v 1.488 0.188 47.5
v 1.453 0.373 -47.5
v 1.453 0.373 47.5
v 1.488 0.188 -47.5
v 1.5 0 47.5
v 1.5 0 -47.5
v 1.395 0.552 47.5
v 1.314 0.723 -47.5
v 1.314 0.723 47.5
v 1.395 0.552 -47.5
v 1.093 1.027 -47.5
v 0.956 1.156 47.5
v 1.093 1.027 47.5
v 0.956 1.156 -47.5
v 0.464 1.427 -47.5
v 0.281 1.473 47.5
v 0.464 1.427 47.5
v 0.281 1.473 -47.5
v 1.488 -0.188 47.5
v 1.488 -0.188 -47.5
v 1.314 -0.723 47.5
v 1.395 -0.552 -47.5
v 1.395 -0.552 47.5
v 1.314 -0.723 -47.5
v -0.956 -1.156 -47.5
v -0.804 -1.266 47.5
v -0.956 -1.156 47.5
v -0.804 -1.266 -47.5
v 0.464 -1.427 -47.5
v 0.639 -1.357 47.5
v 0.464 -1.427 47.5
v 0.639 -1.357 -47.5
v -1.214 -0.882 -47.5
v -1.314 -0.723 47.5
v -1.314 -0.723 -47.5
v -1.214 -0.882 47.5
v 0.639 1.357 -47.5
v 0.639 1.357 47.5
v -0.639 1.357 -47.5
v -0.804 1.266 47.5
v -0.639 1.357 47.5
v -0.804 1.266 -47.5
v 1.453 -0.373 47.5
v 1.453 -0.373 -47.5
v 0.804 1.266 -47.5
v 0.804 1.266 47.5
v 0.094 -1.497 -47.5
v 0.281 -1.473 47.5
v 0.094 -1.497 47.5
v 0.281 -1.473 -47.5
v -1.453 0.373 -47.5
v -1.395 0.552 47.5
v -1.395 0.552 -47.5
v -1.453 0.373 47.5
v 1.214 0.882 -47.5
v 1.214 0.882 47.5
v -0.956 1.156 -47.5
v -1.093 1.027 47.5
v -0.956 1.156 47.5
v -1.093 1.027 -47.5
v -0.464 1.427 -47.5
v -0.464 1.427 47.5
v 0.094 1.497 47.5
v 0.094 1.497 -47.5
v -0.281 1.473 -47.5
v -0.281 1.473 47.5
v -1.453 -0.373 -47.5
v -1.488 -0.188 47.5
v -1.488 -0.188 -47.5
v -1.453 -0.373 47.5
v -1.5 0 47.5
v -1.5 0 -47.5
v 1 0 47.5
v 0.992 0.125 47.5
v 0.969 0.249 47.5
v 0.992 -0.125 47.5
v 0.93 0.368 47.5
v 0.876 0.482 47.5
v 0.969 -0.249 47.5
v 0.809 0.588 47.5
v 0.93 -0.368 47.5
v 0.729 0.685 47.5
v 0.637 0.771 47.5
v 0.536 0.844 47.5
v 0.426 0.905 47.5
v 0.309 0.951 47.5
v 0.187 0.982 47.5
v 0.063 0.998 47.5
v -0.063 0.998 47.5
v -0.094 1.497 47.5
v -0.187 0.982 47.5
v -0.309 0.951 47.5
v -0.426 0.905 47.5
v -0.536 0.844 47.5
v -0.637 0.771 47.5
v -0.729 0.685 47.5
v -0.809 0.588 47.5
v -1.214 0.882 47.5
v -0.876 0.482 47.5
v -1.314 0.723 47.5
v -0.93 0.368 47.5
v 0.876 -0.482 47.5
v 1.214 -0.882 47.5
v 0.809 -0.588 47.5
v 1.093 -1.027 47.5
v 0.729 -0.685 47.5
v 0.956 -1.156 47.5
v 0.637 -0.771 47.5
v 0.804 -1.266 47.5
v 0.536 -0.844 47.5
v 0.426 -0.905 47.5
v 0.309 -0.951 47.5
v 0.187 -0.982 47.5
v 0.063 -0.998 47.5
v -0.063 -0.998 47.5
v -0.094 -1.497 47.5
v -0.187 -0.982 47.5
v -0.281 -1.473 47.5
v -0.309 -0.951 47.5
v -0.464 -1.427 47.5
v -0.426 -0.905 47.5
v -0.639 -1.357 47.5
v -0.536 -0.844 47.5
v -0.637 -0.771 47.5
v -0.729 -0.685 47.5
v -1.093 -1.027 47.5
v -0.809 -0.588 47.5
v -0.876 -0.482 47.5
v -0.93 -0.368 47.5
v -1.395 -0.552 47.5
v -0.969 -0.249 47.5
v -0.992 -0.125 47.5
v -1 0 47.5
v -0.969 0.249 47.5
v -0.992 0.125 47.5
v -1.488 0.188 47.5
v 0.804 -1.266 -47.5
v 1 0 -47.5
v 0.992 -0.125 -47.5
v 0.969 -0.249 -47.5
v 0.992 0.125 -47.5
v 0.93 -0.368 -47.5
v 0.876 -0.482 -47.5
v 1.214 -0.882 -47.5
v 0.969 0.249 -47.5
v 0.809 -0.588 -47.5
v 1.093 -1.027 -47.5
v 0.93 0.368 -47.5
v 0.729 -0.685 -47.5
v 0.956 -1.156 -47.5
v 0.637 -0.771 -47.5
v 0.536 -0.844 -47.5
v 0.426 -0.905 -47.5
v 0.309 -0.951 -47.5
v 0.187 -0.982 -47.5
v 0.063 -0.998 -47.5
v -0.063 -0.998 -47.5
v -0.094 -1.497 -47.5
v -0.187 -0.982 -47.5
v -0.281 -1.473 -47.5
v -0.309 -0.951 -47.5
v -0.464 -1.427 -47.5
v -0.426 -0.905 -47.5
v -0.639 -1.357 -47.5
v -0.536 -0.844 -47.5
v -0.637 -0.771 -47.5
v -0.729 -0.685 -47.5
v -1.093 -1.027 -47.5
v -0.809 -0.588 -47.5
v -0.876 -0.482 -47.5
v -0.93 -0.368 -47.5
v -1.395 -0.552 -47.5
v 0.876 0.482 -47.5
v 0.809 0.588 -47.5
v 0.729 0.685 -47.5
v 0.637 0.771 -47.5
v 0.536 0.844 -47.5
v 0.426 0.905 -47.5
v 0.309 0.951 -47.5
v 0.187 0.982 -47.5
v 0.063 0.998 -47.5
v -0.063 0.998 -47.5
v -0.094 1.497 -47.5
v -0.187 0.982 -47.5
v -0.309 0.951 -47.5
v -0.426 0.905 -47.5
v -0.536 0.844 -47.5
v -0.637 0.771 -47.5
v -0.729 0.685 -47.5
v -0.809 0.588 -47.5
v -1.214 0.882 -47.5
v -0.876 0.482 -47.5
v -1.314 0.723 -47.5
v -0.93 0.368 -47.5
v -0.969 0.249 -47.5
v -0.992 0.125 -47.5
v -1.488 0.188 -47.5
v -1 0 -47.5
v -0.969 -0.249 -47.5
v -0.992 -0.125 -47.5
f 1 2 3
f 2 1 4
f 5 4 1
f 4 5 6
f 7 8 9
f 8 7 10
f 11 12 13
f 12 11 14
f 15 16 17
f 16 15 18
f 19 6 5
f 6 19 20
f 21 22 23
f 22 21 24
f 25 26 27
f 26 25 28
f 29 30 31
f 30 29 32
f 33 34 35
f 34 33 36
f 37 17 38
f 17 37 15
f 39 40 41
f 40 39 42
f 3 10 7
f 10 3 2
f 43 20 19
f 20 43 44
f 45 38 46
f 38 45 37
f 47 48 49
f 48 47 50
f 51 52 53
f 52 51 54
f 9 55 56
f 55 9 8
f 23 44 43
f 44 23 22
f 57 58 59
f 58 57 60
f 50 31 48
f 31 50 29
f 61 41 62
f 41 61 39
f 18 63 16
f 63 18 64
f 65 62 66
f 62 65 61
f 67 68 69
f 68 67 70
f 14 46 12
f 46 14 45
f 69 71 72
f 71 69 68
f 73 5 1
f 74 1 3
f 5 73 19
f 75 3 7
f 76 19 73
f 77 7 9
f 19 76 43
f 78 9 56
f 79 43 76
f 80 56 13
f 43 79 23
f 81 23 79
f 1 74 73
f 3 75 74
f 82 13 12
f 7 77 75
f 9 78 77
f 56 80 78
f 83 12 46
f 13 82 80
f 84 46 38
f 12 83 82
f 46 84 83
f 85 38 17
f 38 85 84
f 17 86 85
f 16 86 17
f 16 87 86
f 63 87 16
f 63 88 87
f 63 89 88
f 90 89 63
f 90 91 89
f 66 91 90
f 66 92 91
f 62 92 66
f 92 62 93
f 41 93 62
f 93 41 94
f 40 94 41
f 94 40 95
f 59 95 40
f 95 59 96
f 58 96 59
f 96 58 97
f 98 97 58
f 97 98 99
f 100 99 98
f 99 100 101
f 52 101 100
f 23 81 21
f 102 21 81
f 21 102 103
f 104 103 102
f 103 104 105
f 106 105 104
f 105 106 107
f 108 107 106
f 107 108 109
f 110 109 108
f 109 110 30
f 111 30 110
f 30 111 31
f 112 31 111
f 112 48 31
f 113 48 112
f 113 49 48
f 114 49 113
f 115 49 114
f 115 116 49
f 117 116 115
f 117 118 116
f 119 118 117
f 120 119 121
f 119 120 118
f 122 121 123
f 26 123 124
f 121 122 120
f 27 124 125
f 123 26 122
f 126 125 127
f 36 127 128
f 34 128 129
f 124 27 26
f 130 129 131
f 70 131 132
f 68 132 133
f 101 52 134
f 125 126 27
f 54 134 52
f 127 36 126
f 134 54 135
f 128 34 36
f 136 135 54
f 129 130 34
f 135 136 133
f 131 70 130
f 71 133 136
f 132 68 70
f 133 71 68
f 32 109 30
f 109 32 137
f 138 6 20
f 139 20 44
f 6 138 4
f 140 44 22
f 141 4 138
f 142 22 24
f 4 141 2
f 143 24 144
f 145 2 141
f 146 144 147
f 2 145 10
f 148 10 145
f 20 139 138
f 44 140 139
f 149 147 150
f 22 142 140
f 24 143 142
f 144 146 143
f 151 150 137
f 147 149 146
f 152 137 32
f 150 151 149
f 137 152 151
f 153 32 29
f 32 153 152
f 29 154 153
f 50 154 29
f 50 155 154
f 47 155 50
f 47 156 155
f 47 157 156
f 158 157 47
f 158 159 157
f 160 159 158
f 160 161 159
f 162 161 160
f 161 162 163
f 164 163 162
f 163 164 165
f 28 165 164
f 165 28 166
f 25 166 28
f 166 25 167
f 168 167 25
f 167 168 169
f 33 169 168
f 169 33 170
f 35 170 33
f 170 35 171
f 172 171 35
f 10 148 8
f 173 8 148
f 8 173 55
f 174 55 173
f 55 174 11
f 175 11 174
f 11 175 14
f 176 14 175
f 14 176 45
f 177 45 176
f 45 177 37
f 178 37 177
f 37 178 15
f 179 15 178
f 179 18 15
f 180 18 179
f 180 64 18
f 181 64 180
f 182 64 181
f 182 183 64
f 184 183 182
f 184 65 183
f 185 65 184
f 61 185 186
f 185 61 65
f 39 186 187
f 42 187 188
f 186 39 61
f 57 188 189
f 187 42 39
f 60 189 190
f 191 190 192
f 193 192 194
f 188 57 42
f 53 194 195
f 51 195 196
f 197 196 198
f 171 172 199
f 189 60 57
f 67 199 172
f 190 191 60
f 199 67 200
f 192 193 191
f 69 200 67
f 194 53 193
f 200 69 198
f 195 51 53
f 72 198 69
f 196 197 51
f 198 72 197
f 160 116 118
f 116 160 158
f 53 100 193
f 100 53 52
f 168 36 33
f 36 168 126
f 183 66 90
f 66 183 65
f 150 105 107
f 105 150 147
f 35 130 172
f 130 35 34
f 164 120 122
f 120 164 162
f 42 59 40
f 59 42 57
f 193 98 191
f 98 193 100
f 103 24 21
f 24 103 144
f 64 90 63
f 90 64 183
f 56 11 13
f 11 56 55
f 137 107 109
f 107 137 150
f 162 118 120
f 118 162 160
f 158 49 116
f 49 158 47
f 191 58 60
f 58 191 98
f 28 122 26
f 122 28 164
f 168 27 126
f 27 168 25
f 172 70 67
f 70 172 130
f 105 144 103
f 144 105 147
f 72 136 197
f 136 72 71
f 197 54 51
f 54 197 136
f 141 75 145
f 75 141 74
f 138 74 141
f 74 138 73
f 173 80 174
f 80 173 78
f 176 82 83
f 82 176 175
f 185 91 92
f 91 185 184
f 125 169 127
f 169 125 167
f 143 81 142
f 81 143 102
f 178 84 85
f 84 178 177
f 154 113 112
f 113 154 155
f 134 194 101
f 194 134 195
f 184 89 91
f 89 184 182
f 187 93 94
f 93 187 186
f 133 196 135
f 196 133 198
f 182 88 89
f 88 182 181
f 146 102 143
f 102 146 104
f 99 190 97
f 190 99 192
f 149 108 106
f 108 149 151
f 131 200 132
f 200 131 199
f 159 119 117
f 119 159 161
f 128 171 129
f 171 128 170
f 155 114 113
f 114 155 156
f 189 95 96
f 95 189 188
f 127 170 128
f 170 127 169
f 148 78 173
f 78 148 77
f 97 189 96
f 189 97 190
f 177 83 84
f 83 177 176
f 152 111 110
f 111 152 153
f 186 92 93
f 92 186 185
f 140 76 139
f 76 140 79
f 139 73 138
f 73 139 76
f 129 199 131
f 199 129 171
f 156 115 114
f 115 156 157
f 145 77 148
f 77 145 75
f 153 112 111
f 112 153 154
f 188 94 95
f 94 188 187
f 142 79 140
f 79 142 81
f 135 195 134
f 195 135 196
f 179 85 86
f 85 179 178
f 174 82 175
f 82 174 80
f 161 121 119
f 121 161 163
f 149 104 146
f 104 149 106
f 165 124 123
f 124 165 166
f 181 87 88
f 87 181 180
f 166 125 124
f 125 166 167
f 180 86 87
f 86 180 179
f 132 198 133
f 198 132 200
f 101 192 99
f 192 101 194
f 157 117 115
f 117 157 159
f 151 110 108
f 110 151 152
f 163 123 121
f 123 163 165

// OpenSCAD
$fn = 50;


difference() {
	union() {
		translate(v = [0, 0, -47.5000000000]) {
			cylinder(h = 95, r = 1.5000000000);
		}
	}
	union() {
		translate(v = [0, 0, -100.0000000000]) {
			cylinder(h = 200, r = 1.0000000000);
		}
	}
}
